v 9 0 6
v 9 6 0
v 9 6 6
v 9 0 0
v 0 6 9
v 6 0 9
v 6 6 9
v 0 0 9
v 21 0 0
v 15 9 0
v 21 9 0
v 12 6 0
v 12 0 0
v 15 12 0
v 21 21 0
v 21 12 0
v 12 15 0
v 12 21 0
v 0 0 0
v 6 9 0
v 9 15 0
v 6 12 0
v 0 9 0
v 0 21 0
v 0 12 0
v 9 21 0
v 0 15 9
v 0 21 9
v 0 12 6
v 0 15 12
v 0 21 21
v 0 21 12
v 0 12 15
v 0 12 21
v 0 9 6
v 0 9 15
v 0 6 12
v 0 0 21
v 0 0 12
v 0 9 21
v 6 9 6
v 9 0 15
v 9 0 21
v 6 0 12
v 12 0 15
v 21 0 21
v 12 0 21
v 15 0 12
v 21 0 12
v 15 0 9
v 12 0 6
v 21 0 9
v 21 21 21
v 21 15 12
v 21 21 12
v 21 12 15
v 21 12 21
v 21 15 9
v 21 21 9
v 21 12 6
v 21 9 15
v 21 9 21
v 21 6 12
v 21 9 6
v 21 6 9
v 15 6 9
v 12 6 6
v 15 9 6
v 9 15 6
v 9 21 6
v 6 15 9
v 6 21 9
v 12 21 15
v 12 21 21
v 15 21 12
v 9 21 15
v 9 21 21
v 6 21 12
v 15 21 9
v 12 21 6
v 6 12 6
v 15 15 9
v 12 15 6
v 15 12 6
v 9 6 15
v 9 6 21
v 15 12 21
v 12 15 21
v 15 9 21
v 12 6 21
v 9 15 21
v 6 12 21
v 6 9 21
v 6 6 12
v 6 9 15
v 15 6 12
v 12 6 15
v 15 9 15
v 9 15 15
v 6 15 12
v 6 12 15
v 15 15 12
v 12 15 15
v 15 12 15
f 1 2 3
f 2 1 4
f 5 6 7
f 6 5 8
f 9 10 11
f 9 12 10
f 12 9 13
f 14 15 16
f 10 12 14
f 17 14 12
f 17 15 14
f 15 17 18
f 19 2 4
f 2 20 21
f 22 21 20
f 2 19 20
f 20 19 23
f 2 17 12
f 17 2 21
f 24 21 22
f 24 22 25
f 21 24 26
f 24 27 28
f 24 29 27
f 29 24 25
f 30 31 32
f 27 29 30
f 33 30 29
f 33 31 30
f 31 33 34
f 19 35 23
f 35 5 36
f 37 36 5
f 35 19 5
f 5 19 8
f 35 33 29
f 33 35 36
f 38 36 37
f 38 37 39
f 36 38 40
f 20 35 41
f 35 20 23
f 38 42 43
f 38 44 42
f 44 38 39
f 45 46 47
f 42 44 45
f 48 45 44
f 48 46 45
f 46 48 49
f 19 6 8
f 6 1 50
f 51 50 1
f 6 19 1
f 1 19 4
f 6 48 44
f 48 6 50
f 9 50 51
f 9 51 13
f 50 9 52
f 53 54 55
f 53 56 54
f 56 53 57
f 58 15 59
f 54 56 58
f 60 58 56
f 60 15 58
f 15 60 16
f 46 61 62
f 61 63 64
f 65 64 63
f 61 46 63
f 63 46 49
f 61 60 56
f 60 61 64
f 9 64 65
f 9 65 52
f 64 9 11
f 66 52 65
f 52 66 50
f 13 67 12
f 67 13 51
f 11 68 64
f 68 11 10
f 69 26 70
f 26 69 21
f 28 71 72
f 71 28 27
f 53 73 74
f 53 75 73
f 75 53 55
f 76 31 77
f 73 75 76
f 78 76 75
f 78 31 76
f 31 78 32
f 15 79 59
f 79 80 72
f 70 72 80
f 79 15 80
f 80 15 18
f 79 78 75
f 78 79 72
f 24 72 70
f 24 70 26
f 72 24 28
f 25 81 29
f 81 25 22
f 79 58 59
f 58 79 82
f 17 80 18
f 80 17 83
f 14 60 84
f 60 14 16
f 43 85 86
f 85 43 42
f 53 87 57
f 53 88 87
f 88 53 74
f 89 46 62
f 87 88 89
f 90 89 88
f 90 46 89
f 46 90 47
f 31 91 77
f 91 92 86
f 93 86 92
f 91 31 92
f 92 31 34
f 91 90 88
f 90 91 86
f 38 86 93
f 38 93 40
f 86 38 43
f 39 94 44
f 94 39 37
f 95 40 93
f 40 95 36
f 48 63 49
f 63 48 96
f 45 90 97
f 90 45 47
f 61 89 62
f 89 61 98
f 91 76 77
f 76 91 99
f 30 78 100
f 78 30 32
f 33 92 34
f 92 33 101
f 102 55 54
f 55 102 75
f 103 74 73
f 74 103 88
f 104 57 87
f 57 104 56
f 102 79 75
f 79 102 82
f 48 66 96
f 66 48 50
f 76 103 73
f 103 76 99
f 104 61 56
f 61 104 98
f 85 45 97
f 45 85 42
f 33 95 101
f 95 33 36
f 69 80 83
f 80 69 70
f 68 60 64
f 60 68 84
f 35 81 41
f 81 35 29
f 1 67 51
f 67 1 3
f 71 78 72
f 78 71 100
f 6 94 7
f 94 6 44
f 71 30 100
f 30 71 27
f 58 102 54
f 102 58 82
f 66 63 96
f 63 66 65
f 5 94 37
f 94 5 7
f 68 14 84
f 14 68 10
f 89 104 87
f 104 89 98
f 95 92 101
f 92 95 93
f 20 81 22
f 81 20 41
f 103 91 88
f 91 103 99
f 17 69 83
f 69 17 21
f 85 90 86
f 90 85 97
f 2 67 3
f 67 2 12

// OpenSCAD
spazio=3; // [1:7]
lato=9; // [9:20]
gap=spazio+lato;
lcube=[lato,lato,lato];


translate([0,0,0]){
	cube(lcube);
	}

translate([gap,0,0]){
	cube(lcube);
	}		

translate([0,gap,0]){
	cube(lcube);
	}	
translate([gap,gap,0]){
	cube(lcube);
	}		
translate([0,0,gap]){
	cube(lcube);
	}

translate([gap,0,gap]){
	cube(lcube);
	}		

translate([0,gap,gap]){
	cube(lcube);
	}	
translate([gap,gap,gap]){
	cube(lcube);
	}		
translate([gap/2,0,gap/2]){
	cube([lato,((lato*2)+spazio),lato]);
	}		
translate([0,gap/2,gap/2]){
cube([((lato*2)+spazio),lato,lato]);
	}		
translate([(gap/2),(gap/2),0]){
cube([lato,lato,((lato*2)+spazio)]);
	}	
